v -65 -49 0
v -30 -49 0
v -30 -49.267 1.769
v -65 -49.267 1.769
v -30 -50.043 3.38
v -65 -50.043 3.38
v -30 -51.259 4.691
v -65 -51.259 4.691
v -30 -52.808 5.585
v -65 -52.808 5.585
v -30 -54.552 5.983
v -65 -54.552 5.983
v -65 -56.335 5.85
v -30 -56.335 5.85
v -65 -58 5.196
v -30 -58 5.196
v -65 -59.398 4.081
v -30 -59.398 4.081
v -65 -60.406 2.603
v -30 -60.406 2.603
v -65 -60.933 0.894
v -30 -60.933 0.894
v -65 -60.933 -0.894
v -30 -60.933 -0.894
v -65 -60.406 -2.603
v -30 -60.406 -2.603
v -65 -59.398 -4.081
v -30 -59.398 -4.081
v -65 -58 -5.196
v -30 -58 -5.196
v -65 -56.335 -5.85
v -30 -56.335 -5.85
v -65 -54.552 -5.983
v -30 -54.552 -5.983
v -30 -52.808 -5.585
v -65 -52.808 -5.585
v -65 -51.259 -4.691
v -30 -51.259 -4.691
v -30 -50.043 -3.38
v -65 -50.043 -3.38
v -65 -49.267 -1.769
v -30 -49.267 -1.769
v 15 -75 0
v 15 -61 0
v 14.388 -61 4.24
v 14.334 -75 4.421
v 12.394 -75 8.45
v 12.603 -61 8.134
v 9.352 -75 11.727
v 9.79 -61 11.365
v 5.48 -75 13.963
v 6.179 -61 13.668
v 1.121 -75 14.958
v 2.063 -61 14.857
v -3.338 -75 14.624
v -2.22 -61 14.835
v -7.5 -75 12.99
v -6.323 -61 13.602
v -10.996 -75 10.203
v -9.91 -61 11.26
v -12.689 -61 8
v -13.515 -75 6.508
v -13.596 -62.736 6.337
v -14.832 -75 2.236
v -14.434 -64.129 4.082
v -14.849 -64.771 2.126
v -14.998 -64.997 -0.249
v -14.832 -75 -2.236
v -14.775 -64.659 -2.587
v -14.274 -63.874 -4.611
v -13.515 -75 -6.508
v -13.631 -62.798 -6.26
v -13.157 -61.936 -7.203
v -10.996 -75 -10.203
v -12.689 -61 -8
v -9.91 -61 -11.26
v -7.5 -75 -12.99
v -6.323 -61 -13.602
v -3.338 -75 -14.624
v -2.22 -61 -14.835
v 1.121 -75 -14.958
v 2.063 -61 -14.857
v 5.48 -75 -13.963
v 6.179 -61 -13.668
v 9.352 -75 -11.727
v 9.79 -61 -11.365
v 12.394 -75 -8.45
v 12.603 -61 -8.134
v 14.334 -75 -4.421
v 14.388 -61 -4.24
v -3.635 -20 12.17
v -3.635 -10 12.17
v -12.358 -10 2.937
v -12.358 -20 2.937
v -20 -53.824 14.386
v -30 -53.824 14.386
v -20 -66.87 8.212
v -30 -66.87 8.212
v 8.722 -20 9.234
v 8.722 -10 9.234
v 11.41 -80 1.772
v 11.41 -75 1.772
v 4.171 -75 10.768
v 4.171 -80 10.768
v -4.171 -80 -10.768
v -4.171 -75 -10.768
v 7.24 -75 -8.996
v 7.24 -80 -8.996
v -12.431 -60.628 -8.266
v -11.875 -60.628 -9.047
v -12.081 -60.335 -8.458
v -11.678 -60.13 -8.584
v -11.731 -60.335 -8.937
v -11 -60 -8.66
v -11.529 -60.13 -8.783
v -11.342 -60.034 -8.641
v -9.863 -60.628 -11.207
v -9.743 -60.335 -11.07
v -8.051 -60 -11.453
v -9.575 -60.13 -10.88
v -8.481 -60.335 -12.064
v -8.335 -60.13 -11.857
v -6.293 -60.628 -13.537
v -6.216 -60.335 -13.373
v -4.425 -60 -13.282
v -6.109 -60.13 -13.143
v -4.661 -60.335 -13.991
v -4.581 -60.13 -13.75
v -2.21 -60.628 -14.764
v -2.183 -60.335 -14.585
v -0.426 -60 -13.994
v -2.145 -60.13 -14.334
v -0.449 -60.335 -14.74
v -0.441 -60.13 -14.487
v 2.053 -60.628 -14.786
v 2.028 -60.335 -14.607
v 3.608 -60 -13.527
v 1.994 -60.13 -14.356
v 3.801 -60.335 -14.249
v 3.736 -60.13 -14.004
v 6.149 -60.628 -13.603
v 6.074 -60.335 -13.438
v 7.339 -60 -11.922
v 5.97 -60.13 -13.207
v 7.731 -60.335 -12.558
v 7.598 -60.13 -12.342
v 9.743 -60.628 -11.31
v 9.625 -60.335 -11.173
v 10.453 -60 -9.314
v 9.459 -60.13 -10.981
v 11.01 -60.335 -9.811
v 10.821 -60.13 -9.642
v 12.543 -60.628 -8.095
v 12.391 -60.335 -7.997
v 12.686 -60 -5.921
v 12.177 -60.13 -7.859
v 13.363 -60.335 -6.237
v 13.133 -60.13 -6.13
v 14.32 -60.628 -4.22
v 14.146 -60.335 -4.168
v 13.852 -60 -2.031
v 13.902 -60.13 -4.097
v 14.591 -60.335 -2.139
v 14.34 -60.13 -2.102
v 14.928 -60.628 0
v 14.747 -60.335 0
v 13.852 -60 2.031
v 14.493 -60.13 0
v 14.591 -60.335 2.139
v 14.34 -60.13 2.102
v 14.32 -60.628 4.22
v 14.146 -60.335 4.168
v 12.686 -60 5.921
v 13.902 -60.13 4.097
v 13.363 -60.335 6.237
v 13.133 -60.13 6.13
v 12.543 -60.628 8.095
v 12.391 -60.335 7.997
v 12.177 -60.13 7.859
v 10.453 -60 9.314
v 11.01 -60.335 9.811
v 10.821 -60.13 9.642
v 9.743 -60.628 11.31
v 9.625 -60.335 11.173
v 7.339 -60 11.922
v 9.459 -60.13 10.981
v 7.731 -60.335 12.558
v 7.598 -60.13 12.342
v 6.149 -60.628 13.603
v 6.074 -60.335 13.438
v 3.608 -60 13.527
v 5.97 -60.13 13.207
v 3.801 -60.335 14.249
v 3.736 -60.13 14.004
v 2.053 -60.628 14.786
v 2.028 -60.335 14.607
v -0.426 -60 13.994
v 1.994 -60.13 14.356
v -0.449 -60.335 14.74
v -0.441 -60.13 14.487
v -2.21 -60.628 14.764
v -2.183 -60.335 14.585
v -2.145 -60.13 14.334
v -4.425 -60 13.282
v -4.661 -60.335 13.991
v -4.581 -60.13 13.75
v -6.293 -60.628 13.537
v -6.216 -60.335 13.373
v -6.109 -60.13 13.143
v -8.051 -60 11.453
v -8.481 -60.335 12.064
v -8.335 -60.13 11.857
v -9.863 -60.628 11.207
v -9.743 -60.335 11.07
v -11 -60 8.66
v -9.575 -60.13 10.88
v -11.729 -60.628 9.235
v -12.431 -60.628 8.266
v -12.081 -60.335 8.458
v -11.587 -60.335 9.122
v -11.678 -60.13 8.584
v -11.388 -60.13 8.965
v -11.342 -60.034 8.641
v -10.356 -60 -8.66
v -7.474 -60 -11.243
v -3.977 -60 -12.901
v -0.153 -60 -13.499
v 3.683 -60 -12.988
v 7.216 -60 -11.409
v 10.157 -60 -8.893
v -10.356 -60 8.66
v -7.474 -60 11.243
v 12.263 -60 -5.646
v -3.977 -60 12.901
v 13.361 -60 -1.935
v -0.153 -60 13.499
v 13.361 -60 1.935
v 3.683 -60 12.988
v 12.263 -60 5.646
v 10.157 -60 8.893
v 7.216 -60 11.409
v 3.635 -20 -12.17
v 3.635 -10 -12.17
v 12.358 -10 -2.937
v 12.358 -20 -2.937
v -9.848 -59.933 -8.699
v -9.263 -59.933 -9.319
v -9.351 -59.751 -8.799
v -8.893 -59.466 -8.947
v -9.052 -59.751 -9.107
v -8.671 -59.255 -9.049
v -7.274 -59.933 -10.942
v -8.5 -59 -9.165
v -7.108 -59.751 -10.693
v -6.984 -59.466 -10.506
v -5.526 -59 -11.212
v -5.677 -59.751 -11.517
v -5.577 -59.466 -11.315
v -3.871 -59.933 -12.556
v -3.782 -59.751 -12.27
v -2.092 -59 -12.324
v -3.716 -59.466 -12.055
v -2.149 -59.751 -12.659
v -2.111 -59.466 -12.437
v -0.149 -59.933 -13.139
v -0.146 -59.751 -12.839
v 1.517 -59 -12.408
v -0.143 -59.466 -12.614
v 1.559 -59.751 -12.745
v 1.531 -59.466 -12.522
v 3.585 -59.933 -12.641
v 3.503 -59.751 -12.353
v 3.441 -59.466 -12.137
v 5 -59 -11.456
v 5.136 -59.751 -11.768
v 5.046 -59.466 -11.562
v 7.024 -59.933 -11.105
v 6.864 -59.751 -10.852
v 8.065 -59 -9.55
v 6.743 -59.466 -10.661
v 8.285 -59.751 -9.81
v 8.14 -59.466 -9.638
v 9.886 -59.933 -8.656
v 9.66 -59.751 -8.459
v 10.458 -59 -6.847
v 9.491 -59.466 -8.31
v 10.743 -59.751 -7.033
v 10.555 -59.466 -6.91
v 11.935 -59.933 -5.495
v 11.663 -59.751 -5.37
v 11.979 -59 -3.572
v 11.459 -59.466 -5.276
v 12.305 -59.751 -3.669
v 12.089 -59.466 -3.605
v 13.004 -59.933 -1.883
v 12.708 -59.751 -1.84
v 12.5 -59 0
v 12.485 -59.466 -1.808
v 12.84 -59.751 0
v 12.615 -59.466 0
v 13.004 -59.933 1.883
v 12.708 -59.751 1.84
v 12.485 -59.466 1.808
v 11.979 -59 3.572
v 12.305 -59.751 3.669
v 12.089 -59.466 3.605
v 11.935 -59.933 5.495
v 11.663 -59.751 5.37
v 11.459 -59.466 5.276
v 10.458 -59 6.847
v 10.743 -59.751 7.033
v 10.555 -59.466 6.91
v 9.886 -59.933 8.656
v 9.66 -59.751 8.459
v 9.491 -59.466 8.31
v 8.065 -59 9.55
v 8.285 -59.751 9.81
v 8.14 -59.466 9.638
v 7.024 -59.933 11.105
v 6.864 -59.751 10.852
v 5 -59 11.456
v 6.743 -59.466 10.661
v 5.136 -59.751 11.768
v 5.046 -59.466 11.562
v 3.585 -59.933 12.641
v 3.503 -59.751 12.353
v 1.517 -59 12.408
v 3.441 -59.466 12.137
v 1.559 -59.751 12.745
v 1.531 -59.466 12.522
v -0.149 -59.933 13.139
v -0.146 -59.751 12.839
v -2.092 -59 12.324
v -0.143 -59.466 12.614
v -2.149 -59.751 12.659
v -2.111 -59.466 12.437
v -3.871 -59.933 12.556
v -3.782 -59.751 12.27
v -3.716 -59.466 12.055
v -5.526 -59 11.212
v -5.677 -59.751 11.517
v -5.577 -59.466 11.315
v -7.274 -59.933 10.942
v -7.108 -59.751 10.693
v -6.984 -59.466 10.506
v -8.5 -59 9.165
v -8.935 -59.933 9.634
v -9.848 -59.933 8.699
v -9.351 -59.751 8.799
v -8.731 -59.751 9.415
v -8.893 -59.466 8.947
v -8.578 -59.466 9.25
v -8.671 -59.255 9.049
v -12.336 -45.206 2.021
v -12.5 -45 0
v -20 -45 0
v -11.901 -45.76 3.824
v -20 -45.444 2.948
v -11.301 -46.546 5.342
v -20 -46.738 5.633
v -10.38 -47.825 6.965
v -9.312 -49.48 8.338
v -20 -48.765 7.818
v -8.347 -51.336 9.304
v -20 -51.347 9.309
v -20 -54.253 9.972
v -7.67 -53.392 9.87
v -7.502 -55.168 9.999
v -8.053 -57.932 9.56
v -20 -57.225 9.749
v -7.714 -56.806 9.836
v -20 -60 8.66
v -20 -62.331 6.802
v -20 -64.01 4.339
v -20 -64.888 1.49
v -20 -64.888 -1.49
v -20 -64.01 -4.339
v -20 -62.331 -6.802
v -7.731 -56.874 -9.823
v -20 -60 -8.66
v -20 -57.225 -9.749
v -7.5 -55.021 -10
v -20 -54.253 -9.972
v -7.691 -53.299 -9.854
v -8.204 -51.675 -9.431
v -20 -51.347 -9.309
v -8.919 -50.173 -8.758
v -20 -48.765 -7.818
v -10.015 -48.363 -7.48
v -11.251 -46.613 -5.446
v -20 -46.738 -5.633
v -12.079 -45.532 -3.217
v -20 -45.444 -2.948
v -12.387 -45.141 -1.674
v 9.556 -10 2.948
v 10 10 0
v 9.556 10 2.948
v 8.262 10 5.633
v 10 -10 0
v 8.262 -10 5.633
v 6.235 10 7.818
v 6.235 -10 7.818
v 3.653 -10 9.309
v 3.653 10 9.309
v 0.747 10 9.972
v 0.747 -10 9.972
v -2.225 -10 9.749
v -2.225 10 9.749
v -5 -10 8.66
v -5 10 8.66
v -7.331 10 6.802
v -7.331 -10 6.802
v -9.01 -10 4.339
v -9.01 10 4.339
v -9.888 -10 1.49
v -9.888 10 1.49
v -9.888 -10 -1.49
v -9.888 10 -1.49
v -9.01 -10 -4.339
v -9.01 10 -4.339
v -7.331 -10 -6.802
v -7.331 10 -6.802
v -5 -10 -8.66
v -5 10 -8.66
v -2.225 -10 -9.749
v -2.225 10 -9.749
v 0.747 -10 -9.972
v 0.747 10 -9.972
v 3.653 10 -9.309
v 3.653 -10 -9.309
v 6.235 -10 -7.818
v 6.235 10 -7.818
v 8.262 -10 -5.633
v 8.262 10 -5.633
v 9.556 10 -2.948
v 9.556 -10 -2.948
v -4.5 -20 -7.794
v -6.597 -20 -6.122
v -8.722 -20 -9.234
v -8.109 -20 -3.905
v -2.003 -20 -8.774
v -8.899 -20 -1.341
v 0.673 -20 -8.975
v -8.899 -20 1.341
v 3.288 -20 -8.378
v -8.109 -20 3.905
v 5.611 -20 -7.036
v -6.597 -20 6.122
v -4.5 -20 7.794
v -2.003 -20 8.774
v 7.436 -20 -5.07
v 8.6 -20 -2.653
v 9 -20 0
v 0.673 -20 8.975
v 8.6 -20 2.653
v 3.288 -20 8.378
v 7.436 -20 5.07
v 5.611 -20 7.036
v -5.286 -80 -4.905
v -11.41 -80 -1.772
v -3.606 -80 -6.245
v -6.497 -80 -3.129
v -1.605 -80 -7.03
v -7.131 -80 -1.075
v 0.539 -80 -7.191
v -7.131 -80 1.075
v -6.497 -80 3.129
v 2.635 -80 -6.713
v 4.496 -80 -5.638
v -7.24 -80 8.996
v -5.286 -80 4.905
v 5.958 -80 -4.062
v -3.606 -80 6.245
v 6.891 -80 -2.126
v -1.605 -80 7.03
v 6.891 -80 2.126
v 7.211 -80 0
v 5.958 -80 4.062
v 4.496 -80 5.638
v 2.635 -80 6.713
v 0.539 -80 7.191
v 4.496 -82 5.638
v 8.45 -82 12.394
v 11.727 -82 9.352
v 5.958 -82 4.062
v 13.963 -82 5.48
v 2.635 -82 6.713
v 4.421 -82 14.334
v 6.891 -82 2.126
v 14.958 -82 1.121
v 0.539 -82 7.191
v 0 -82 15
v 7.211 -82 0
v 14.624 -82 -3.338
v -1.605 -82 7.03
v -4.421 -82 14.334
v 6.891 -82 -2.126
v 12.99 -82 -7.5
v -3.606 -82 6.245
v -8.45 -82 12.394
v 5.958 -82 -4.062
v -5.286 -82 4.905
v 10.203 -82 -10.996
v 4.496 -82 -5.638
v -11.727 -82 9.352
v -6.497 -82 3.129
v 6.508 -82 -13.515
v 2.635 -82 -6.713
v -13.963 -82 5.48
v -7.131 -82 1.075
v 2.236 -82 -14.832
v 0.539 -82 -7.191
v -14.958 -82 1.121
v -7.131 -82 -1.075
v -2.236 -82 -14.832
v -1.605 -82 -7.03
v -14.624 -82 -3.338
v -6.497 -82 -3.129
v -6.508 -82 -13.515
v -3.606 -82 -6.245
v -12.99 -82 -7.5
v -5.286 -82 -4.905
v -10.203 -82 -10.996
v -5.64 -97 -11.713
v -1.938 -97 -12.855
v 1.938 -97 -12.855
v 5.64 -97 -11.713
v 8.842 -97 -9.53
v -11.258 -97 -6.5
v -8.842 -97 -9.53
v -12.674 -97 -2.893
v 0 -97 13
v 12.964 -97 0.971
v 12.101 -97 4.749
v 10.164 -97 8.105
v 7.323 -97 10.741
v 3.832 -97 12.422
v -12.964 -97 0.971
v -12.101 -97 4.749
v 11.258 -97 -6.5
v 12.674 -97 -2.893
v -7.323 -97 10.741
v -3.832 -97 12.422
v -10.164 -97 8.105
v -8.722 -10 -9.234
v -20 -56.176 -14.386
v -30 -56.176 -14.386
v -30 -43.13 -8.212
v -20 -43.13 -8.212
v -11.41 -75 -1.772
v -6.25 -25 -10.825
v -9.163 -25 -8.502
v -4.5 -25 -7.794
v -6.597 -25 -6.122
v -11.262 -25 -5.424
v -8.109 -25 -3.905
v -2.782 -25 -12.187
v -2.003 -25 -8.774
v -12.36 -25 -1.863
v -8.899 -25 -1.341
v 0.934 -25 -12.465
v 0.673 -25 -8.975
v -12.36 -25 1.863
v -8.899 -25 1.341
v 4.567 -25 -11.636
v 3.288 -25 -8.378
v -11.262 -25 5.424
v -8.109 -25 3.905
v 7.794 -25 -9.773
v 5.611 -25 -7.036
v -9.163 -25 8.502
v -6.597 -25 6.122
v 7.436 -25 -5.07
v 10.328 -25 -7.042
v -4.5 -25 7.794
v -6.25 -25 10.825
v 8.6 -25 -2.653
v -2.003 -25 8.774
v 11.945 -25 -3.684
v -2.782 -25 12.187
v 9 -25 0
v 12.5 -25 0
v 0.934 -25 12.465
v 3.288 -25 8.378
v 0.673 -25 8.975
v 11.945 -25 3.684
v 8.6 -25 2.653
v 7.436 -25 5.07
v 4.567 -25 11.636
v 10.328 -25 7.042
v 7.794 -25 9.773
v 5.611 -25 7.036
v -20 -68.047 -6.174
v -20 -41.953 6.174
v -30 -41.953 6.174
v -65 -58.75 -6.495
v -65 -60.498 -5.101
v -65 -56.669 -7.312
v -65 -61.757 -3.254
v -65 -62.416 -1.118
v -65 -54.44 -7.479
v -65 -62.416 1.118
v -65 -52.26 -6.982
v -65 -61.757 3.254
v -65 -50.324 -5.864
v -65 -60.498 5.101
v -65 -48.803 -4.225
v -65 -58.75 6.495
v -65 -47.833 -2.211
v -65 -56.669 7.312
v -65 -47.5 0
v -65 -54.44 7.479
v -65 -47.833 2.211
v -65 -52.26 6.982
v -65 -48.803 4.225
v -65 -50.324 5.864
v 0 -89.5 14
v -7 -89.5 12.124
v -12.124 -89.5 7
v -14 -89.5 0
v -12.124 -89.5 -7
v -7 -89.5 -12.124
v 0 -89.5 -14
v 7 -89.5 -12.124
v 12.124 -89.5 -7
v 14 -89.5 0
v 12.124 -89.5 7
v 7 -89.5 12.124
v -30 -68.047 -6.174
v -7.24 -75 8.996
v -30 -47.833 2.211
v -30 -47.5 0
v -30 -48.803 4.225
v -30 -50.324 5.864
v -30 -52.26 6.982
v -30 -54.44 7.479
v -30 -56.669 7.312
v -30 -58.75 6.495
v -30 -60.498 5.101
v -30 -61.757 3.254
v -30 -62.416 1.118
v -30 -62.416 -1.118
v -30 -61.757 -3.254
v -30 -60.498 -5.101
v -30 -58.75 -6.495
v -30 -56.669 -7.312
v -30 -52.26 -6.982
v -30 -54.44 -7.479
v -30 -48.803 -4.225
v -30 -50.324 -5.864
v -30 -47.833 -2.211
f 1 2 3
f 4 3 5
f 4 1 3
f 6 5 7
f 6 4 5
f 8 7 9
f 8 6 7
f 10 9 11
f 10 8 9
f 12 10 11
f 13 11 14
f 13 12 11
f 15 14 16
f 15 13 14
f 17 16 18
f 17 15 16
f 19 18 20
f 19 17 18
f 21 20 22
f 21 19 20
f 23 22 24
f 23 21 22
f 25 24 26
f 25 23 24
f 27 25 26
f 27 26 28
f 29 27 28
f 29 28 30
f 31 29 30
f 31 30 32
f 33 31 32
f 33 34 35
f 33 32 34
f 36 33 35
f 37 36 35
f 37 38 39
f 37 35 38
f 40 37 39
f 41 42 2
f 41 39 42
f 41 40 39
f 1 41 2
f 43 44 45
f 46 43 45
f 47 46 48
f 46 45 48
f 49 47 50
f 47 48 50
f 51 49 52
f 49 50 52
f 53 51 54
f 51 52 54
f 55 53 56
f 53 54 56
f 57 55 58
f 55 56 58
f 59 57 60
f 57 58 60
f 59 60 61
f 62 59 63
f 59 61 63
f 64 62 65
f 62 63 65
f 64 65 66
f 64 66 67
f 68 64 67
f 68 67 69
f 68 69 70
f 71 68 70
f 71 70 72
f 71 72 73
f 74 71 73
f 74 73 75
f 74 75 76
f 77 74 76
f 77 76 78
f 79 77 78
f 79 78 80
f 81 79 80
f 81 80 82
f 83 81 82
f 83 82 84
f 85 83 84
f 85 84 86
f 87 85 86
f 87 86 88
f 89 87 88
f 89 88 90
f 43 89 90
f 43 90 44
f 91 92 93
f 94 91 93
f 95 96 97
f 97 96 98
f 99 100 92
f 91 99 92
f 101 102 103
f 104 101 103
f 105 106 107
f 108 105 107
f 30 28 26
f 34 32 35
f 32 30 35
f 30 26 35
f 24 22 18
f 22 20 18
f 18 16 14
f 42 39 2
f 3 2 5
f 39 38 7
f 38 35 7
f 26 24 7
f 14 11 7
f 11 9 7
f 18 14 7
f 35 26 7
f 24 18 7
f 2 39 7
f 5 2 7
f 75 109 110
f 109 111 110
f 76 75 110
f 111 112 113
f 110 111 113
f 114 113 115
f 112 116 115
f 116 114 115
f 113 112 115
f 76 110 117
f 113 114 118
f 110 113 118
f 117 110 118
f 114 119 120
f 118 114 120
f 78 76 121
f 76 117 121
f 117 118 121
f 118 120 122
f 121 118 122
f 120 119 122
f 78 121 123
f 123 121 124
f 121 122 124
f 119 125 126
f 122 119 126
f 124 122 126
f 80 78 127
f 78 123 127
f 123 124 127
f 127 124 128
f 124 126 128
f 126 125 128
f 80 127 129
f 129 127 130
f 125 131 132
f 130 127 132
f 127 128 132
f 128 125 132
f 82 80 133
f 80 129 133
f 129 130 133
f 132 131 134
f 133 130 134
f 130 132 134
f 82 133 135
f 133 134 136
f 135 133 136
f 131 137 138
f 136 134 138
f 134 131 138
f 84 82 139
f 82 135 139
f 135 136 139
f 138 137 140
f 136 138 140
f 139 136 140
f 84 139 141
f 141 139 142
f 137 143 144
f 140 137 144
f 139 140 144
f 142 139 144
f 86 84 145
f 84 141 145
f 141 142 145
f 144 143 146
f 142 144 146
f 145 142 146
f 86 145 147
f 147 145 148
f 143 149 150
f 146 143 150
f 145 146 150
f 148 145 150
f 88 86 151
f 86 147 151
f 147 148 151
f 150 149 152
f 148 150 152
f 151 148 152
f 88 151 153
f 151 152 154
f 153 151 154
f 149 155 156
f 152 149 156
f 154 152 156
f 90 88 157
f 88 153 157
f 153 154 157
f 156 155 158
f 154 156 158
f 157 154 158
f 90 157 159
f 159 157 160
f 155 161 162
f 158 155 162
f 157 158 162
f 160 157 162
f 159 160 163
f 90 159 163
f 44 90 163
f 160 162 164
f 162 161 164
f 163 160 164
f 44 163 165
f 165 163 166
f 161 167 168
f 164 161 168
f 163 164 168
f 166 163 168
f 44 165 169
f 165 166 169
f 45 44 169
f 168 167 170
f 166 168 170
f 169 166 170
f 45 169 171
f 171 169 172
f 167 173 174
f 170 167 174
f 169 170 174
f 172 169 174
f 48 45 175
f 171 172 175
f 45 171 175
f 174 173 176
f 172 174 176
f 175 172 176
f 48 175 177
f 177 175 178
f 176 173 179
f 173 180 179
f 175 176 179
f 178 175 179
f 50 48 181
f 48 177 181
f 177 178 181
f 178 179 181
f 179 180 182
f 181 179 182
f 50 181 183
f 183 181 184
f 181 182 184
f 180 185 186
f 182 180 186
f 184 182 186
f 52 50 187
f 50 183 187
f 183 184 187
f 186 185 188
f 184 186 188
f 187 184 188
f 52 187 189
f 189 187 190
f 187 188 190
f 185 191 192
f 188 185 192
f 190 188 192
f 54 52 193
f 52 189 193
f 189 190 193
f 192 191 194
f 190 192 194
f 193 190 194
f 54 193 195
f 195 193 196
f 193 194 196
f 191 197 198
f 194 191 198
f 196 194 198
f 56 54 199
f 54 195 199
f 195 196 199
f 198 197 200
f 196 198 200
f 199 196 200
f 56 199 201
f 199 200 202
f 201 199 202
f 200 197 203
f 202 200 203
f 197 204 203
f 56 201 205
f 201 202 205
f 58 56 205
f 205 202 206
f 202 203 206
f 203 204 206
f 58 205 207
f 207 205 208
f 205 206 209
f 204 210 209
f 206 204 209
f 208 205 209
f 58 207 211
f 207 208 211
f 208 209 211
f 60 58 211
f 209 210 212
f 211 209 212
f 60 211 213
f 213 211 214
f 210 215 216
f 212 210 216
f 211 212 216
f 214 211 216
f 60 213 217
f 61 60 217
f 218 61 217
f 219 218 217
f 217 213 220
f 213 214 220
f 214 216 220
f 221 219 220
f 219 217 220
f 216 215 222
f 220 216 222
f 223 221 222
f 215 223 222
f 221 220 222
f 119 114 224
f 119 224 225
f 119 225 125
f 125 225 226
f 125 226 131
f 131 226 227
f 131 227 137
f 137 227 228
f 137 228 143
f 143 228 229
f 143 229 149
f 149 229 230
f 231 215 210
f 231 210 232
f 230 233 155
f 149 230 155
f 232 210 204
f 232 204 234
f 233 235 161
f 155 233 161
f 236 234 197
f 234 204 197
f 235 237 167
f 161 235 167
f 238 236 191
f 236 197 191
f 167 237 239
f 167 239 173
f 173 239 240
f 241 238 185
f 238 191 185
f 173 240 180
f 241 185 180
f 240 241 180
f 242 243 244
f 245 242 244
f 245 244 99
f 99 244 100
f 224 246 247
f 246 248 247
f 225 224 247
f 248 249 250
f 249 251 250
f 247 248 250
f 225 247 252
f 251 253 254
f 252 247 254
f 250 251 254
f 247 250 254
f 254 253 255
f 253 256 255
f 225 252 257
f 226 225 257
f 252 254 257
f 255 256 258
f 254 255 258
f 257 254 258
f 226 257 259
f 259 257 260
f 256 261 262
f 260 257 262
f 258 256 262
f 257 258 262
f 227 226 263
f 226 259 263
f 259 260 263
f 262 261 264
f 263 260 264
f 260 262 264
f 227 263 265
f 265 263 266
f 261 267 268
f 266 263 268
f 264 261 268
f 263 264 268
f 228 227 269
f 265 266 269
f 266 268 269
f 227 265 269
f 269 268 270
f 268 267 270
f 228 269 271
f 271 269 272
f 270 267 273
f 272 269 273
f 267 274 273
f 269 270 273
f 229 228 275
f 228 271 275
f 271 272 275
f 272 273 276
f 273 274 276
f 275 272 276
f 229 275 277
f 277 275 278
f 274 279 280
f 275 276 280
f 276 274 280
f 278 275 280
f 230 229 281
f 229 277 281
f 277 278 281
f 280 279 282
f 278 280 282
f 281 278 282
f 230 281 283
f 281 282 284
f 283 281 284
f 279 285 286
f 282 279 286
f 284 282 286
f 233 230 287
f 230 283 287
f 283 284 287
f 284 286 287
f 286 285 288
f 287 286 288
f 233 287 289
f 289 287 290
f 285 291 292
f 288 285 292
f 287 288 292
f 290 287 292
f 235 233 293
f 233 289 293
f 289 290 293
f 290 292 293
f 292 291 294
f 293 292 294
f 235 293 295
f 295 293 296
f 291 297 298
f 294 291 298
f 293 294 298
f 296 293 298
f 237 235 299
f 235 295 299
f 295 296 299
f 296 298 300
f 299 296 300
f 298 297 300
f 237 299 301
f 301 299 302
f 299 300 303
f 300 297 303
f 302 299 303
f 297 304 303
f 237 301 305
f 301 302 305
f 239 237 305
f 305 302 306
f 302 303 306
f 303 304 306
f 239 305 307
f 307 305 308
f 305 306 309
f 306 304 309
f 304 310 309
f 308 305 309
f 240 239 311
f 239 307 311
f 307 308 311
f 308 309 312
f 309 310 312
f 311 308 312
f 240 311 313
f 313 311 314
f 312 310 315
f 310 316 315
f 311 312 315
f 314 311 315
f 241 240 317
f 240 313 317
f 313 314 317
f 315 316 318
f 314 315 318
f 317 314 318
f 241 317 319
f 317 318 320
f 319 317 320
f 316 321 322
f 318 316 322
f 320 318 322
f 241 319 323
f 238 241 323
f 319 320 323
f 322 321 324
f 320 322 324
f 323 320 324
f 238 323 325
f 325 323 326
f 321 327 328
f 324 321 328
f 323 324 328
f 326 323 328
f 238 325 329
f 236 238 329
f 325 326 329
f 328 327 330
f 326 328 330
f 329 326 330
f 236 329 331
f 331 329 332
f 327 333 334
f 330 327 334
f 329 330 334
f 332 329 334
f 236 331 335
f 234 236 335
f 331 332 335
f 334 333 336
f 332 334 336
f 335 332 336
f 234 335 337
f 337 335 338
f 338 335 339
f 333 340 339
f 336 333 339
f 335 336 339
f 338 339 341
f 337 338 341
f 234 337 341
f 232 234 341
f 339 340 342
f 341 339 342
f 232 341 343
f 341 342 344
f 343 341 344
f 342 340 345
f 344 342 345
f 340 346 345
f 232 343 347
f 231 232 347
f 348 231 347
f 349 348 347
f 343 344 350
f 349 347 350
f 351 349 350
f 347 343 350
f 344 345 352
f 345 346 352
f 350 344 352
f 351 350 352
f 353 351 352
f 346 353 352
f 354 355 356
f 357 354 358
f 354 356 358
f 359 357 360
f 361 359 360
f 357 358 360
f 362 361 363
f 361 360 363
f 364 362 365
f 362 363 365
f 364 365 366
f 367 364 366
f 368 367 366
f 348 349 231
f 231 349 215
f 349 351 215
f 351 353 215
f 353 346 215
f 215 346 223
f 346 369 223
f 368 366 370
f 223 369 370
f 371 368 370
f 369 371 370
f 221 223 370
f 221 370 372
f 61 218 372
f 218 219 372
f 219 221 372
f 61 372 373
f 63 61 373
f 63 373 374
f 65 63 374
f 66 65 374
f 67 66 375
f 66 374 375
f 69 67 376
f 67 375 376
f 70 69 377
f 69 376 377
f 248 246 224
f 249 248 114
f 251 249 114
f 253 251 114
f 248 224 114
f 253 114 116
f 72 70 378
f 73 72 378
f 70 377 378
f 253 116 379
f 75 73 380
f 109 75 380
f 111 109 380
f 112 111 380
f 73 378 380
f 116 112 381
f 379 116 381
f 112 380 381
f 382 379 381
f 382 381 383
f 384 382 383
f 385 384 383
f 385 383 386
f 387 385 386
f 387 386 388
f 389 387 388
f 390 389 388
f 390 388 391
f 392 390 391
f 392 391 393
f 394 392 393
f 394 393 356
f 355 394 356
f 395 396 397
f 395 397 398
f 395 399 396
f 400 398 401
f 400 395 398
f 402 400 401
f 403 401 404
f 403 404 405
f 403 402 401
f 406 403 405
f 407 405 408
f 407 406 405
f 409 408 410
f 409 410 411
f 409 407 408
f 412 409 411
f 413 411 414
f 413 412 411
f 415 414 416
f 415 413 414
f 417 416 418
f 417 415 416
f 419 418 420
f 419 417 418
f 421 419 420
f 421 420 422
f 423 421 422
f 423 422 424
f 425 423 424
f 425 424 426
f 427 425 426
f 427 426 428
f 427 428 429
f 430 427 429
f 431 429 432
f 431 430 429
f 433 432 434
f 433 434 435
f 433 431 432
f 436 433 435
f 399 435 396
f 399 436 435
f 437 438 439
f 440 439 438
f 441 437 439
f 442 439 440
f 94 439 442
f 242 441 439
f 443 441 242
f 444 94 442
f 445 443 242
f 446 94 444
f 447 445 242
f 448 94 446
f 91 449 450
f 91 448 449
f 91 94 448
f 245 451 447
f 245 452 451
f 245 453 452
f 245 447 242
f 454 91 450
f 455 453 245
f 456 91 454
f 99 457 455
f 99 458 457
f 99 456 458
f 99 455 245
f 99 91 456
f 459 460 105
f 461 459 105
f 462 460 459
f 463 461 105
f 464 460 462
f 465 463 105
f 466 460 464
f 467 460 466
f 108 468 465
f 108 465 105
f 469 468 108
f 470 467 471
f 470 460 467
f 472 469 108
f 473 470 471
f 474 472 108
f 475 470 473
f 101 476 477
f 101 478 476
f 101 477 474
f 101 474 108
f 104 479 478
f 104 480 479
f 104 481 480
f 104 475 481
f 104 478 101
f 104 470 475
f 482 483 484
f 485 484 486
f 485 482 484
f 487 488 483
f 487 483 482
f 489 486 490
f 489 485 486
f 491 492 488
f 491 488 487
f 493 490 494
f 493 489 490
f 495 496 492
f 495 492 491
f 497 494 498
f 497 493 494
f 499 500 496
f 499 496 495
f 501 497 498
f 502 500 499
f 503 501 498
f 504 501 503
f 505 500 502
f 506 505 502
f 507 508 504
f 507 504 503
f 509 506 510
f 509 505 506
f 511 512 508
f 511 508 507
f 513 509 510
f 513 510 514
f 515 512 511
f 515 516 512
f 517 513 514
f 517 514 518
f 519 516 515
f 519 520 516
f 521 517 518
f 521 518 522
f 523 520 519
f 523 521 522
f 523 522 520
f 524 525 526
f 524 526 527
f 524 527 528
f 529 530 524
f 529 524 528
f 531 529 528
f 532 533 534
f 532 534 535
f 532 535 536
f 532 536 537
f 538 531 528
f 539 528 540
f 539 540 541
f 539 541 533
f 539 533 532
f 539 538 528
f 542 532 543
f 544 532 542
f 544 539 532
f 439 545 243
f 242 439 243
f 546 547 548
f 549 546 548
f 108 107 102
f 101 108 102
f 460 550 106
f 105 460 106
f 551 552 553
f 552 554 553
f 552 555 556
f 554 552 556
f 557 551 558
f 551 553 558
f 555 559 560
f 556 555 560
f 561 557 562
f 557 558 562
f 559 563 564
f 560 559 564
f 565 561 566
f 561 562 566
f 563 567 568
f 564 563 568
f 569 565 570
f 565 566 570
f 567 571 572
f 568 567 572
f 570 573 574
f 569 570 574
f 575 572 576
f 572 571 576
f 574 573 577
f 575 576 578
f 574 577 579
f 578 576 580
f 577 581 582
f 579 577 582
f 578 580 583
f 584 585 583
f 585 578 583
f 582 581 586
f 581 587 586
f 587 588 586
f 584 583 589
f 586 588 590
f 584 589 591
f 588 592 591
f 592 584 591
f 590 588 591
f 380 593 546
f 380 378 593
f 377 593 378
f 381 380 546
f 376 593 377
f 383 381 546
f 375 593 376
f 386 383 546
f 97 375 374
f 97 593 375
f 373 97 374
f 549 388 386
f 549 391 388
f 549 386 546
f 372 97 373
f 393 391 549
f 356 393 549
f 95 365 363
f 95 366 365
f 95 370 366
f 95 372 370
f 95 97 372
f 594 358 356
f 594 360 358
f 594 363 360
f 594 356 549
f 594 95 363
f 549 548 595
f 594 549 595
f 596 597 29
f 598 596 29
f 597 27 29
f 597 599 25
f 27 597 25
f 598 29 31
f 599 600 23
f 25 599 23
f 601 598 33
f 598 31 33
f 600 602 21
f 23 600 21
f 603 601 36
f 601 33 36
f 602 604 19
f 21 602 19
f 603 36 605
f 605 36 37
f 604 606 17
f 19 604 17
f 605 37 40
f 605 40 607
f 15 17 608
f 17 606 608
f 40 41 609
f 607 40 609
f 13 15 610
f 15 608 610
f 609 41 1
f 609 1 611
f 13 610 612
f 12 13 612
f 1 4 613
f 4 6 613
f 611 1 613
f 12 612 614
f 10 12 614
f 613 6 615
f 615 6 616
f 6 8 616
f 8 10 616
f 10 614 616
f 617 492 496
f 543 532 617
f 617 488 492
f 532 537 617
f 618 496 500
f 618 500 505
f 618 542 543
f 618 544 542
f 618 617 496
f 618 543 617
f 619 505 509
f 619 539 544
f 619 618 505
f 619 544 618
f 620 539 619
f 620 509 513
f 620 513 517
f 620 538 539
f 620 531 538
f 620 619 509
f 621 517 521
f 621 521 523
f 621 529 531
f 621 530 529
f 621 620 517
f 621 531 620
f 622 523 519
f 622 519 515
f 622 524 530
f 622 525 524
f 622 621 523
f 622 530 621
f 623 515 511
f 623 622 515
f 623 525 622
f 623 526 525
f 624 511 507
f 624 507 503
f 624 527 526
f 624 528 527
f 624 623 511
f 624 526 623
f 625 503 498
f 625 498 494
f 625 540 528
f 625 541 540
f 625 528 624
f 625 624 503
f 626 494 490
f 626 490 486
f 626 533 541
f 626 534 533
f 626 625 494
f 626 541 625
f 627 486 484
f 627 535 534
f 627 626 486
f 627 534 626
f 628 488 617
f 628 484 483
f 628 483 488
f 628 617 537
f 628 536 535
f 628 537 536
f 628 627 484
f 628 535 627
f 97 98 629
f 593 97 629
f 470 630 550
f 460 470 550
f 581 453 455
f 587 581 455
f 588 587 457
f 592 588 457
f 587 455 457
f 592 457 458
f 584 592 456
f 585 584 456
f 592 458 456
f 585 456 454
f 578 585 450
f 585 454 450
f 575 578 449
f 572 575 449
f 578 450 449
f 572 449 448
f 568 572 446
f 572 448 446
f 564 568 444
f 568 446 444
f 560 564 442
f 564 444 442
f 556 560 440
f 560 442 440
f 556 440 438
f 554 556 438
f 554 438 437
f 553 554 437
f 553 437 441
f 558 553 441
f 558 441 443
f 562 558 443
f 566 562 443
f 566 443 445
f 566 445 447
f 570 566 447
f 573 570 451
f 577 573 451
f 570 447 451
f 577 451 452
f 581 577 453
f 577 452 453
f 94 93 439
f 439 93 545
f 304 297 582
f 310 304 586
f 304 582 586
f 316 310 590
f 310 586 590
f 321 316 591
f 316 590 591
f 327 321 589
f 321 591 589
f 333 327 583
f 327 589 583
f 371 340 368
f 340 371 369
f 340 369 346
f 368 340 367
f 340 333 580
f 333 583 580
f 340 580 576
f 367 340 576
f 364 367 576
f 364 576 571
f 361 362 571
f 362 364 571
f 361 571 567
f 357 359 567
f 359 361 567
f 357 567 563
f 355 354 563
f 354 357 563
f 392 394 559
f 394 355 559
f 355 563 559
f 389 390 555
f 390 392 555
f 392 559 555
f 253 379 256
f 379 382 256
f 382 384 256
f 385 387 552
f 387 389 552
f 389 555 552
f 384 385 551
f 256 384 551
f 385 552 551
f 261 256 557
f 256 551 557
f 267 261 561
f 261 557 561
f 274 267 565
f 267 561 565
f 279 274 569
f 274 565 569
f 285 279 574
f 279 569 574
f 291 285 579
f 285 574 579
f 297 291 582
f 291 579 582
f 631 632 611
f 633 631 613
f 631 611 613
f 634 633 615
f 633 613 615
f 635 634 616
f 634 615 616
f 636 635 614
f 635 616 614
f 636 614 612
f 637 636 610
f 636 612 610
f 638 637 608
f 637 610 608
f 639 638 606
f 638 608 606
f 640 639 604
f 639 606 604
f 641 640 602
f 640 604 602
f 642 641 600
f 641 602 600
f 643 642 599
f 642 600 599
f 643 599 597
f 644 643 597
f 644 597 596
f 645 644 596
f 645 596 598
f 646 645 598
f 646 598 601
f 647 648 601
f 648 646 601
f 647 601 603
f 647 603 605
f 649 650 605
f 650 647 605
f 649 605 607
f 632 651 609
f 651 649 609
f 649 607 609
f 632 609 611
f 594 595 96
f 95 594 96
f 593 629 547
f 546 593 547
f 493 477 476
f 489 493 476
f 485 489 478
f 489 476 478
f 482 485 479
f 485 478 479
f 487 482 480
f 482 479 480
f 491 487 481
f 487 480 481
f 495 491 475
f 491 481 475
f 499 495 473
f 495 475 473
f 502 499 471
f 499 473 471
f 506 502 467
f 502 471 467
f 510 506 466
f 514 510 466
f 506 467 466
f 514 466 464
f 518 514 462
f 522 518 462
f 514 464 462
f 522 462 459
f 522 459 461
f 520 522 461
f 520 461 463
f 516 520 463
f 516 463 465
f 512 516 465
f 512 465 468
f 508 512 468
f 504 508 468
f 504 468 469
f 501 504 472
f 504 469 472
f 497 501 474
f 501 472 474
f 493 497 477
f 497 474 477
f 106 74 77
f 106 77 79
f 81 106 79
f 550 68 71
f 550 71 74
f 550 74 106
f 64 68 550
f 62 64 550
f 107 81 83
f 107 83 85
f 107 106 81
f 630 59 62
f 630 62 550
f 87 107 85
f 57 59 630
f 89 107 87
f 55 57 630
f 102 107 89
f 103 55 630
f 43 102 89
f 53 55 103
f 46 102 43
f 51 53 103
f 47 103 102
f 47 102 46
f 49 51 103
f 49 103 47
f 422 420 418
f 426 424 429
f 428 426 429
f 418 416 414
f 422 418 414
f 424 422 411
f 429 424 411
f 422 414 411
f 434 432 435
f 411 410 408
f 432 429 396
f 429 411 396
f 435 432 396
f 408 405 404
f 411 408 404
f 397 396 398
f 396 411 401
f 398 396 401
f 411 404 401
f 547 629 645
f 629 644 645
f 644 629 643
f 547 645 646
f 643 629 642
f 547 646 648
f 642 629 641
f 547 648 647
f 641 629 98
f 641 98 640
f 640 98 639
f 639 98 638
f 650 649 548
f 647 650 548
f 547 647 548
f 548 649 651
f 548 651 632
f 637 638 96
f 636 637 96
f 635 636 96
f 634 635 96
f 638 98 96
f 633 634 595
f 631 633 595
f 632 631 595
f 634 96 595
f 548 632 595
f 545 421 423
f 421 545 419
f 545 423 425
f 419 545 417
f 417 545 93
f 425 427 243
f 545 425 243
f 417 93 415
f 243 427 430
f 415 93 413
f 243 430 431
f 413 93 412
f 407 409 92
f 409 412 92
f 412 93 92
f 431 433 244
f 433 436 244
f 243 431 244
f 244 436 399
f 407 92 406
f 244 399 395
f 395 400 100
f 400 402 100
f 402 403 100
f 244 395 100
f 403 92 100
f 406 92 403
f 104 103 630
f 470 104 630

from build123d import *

# Parameters (mm, degrees)
F0_R      = 10
F1_DEPTH  = 10
F3_DEPTH  = 10
F4_R      = 9
F5_DEPTH  = 5
F6_R      = 12.5
F7_DEPTH  = 35
F8_R      = 15
F9_DEPTH  = 15
F10_R     = 1
F12_DEPTH = 5
F13_R     = 7.2112985608
F14_DEPTH = 2
F19_R     = 7.5
F19_R_2   = 6
F23_DEPTH = 10
F24_R     = 10
F25_DEPTH = 15


with BuildPart() as f1:
    # F0 (on Front) → F1 (new body, symmetric)
    with BuildSketch(Plane.XZ):
        Circle(F0_R)
    extrude(amount=F1_DEPTH, both=True)

    # F2 (on face) → F3 (join)
    with BuildSketch(Plane.XZ.offset(10)):
        Polygon((3.6354375365, -12.1703297922), (12.3575335407, -2.9367836356), (8.7220960043, 9.2335461566), (-3.6354375365, 12.1703297922), (-12.3575335407, 2.9367836356), (-8.7220960043, -9.2335461566), align=None)
    extrude(amount=F3_DEPTH)

    # F4 (on face) → F5 (join)
    with BuildSketch(Plane.XZ.offset(20)):
        Circle(F4_R)
    extrude(amount=F5_DEPTH)

    # F6 (on face) → F7 (join)
    with BuildSketch(Plane.XZ.offset(25)):
        Circle(F6_R)
    extrude(amount=F7_DEPTH)

    # F8 (on face) → F9 (join)
    with BuildSketch(Plane.XZ.offset(60)):
        Circle(F8_R)
    extrude(amount=F9_DEPTH)

    # F10
    f10_edges = [f1.edges().sort_by_distance(p)[0] for p in [
        (-15, -60, 0),
        (-12.5, -60, 0),
    ]]
    fillet(f10_edges, radius=F10_R)

    # F11 (on face) → F12 (join)
    with BuildSketch(Plane.XZ.offset(75)):
        Polygon((7.2396767244, -8.9955774834), (11.4102369845, 1.7719552168), (4.1705602602, 10.7675327002), (-7.2396767244, 8.9955774834), (-11.4102369845, -1.7719552168), (-4.1705602602, -10.7675327002), align=None)
    extrude(amount=F12_DEPTH)

    # F13 (on face) → F14 (join)
    with BuildSketch(Plane.XZ.offset(80)):
        Circle(F13_R)
    extrude(amount=F14_DEPTH)

    # F15 (on Right) → F16 (revolve)
    with BuildSketch(Plane.YZ):
        Polygon((-97, 0), (-82, 0), (-82, 7.2112985608), (-82, 15), (-97, 13), align=None)
    revolve(axis=Axis((0, -41, 0), (0, -1, 0)))

    # F19 (on offset) → F20 (join, up to the next surface of F1)
    with BuildSketch(Plane.YZ.offset(-65)):
        with Locations((-55, 0)):
            Circle(F19_R)
        with Locations((-55, 0)):
            Circle(F19_R_2, mode=Mode.SUBTRACT)
    extrude(until=Until.NEXT)

    # F22 (on offset) → F23 (join)
    with BuildSketch(Plane.YZ.offset(-30)):
        Polygon((-68.0466406272, -6.1740182765), (-56.1764636427, -14.3857313554), (-43.1298230155, -8.2117130789), (-41.9533593728, 6.1740182765), (-53.8235363573, 14.3857313554), (-66.8701769845, 8.2117130789), align=None)
    extrude(amount=F23_DEPTH)

    # F24 (on face) → F25 (join)
    with BuildSketch(Plane.YZ.offset(-20)):
        with Locations((-55, 0)):
            Circle(F24_R)
    extrude(amount=F25_DEPTH)


solid = f1.part
